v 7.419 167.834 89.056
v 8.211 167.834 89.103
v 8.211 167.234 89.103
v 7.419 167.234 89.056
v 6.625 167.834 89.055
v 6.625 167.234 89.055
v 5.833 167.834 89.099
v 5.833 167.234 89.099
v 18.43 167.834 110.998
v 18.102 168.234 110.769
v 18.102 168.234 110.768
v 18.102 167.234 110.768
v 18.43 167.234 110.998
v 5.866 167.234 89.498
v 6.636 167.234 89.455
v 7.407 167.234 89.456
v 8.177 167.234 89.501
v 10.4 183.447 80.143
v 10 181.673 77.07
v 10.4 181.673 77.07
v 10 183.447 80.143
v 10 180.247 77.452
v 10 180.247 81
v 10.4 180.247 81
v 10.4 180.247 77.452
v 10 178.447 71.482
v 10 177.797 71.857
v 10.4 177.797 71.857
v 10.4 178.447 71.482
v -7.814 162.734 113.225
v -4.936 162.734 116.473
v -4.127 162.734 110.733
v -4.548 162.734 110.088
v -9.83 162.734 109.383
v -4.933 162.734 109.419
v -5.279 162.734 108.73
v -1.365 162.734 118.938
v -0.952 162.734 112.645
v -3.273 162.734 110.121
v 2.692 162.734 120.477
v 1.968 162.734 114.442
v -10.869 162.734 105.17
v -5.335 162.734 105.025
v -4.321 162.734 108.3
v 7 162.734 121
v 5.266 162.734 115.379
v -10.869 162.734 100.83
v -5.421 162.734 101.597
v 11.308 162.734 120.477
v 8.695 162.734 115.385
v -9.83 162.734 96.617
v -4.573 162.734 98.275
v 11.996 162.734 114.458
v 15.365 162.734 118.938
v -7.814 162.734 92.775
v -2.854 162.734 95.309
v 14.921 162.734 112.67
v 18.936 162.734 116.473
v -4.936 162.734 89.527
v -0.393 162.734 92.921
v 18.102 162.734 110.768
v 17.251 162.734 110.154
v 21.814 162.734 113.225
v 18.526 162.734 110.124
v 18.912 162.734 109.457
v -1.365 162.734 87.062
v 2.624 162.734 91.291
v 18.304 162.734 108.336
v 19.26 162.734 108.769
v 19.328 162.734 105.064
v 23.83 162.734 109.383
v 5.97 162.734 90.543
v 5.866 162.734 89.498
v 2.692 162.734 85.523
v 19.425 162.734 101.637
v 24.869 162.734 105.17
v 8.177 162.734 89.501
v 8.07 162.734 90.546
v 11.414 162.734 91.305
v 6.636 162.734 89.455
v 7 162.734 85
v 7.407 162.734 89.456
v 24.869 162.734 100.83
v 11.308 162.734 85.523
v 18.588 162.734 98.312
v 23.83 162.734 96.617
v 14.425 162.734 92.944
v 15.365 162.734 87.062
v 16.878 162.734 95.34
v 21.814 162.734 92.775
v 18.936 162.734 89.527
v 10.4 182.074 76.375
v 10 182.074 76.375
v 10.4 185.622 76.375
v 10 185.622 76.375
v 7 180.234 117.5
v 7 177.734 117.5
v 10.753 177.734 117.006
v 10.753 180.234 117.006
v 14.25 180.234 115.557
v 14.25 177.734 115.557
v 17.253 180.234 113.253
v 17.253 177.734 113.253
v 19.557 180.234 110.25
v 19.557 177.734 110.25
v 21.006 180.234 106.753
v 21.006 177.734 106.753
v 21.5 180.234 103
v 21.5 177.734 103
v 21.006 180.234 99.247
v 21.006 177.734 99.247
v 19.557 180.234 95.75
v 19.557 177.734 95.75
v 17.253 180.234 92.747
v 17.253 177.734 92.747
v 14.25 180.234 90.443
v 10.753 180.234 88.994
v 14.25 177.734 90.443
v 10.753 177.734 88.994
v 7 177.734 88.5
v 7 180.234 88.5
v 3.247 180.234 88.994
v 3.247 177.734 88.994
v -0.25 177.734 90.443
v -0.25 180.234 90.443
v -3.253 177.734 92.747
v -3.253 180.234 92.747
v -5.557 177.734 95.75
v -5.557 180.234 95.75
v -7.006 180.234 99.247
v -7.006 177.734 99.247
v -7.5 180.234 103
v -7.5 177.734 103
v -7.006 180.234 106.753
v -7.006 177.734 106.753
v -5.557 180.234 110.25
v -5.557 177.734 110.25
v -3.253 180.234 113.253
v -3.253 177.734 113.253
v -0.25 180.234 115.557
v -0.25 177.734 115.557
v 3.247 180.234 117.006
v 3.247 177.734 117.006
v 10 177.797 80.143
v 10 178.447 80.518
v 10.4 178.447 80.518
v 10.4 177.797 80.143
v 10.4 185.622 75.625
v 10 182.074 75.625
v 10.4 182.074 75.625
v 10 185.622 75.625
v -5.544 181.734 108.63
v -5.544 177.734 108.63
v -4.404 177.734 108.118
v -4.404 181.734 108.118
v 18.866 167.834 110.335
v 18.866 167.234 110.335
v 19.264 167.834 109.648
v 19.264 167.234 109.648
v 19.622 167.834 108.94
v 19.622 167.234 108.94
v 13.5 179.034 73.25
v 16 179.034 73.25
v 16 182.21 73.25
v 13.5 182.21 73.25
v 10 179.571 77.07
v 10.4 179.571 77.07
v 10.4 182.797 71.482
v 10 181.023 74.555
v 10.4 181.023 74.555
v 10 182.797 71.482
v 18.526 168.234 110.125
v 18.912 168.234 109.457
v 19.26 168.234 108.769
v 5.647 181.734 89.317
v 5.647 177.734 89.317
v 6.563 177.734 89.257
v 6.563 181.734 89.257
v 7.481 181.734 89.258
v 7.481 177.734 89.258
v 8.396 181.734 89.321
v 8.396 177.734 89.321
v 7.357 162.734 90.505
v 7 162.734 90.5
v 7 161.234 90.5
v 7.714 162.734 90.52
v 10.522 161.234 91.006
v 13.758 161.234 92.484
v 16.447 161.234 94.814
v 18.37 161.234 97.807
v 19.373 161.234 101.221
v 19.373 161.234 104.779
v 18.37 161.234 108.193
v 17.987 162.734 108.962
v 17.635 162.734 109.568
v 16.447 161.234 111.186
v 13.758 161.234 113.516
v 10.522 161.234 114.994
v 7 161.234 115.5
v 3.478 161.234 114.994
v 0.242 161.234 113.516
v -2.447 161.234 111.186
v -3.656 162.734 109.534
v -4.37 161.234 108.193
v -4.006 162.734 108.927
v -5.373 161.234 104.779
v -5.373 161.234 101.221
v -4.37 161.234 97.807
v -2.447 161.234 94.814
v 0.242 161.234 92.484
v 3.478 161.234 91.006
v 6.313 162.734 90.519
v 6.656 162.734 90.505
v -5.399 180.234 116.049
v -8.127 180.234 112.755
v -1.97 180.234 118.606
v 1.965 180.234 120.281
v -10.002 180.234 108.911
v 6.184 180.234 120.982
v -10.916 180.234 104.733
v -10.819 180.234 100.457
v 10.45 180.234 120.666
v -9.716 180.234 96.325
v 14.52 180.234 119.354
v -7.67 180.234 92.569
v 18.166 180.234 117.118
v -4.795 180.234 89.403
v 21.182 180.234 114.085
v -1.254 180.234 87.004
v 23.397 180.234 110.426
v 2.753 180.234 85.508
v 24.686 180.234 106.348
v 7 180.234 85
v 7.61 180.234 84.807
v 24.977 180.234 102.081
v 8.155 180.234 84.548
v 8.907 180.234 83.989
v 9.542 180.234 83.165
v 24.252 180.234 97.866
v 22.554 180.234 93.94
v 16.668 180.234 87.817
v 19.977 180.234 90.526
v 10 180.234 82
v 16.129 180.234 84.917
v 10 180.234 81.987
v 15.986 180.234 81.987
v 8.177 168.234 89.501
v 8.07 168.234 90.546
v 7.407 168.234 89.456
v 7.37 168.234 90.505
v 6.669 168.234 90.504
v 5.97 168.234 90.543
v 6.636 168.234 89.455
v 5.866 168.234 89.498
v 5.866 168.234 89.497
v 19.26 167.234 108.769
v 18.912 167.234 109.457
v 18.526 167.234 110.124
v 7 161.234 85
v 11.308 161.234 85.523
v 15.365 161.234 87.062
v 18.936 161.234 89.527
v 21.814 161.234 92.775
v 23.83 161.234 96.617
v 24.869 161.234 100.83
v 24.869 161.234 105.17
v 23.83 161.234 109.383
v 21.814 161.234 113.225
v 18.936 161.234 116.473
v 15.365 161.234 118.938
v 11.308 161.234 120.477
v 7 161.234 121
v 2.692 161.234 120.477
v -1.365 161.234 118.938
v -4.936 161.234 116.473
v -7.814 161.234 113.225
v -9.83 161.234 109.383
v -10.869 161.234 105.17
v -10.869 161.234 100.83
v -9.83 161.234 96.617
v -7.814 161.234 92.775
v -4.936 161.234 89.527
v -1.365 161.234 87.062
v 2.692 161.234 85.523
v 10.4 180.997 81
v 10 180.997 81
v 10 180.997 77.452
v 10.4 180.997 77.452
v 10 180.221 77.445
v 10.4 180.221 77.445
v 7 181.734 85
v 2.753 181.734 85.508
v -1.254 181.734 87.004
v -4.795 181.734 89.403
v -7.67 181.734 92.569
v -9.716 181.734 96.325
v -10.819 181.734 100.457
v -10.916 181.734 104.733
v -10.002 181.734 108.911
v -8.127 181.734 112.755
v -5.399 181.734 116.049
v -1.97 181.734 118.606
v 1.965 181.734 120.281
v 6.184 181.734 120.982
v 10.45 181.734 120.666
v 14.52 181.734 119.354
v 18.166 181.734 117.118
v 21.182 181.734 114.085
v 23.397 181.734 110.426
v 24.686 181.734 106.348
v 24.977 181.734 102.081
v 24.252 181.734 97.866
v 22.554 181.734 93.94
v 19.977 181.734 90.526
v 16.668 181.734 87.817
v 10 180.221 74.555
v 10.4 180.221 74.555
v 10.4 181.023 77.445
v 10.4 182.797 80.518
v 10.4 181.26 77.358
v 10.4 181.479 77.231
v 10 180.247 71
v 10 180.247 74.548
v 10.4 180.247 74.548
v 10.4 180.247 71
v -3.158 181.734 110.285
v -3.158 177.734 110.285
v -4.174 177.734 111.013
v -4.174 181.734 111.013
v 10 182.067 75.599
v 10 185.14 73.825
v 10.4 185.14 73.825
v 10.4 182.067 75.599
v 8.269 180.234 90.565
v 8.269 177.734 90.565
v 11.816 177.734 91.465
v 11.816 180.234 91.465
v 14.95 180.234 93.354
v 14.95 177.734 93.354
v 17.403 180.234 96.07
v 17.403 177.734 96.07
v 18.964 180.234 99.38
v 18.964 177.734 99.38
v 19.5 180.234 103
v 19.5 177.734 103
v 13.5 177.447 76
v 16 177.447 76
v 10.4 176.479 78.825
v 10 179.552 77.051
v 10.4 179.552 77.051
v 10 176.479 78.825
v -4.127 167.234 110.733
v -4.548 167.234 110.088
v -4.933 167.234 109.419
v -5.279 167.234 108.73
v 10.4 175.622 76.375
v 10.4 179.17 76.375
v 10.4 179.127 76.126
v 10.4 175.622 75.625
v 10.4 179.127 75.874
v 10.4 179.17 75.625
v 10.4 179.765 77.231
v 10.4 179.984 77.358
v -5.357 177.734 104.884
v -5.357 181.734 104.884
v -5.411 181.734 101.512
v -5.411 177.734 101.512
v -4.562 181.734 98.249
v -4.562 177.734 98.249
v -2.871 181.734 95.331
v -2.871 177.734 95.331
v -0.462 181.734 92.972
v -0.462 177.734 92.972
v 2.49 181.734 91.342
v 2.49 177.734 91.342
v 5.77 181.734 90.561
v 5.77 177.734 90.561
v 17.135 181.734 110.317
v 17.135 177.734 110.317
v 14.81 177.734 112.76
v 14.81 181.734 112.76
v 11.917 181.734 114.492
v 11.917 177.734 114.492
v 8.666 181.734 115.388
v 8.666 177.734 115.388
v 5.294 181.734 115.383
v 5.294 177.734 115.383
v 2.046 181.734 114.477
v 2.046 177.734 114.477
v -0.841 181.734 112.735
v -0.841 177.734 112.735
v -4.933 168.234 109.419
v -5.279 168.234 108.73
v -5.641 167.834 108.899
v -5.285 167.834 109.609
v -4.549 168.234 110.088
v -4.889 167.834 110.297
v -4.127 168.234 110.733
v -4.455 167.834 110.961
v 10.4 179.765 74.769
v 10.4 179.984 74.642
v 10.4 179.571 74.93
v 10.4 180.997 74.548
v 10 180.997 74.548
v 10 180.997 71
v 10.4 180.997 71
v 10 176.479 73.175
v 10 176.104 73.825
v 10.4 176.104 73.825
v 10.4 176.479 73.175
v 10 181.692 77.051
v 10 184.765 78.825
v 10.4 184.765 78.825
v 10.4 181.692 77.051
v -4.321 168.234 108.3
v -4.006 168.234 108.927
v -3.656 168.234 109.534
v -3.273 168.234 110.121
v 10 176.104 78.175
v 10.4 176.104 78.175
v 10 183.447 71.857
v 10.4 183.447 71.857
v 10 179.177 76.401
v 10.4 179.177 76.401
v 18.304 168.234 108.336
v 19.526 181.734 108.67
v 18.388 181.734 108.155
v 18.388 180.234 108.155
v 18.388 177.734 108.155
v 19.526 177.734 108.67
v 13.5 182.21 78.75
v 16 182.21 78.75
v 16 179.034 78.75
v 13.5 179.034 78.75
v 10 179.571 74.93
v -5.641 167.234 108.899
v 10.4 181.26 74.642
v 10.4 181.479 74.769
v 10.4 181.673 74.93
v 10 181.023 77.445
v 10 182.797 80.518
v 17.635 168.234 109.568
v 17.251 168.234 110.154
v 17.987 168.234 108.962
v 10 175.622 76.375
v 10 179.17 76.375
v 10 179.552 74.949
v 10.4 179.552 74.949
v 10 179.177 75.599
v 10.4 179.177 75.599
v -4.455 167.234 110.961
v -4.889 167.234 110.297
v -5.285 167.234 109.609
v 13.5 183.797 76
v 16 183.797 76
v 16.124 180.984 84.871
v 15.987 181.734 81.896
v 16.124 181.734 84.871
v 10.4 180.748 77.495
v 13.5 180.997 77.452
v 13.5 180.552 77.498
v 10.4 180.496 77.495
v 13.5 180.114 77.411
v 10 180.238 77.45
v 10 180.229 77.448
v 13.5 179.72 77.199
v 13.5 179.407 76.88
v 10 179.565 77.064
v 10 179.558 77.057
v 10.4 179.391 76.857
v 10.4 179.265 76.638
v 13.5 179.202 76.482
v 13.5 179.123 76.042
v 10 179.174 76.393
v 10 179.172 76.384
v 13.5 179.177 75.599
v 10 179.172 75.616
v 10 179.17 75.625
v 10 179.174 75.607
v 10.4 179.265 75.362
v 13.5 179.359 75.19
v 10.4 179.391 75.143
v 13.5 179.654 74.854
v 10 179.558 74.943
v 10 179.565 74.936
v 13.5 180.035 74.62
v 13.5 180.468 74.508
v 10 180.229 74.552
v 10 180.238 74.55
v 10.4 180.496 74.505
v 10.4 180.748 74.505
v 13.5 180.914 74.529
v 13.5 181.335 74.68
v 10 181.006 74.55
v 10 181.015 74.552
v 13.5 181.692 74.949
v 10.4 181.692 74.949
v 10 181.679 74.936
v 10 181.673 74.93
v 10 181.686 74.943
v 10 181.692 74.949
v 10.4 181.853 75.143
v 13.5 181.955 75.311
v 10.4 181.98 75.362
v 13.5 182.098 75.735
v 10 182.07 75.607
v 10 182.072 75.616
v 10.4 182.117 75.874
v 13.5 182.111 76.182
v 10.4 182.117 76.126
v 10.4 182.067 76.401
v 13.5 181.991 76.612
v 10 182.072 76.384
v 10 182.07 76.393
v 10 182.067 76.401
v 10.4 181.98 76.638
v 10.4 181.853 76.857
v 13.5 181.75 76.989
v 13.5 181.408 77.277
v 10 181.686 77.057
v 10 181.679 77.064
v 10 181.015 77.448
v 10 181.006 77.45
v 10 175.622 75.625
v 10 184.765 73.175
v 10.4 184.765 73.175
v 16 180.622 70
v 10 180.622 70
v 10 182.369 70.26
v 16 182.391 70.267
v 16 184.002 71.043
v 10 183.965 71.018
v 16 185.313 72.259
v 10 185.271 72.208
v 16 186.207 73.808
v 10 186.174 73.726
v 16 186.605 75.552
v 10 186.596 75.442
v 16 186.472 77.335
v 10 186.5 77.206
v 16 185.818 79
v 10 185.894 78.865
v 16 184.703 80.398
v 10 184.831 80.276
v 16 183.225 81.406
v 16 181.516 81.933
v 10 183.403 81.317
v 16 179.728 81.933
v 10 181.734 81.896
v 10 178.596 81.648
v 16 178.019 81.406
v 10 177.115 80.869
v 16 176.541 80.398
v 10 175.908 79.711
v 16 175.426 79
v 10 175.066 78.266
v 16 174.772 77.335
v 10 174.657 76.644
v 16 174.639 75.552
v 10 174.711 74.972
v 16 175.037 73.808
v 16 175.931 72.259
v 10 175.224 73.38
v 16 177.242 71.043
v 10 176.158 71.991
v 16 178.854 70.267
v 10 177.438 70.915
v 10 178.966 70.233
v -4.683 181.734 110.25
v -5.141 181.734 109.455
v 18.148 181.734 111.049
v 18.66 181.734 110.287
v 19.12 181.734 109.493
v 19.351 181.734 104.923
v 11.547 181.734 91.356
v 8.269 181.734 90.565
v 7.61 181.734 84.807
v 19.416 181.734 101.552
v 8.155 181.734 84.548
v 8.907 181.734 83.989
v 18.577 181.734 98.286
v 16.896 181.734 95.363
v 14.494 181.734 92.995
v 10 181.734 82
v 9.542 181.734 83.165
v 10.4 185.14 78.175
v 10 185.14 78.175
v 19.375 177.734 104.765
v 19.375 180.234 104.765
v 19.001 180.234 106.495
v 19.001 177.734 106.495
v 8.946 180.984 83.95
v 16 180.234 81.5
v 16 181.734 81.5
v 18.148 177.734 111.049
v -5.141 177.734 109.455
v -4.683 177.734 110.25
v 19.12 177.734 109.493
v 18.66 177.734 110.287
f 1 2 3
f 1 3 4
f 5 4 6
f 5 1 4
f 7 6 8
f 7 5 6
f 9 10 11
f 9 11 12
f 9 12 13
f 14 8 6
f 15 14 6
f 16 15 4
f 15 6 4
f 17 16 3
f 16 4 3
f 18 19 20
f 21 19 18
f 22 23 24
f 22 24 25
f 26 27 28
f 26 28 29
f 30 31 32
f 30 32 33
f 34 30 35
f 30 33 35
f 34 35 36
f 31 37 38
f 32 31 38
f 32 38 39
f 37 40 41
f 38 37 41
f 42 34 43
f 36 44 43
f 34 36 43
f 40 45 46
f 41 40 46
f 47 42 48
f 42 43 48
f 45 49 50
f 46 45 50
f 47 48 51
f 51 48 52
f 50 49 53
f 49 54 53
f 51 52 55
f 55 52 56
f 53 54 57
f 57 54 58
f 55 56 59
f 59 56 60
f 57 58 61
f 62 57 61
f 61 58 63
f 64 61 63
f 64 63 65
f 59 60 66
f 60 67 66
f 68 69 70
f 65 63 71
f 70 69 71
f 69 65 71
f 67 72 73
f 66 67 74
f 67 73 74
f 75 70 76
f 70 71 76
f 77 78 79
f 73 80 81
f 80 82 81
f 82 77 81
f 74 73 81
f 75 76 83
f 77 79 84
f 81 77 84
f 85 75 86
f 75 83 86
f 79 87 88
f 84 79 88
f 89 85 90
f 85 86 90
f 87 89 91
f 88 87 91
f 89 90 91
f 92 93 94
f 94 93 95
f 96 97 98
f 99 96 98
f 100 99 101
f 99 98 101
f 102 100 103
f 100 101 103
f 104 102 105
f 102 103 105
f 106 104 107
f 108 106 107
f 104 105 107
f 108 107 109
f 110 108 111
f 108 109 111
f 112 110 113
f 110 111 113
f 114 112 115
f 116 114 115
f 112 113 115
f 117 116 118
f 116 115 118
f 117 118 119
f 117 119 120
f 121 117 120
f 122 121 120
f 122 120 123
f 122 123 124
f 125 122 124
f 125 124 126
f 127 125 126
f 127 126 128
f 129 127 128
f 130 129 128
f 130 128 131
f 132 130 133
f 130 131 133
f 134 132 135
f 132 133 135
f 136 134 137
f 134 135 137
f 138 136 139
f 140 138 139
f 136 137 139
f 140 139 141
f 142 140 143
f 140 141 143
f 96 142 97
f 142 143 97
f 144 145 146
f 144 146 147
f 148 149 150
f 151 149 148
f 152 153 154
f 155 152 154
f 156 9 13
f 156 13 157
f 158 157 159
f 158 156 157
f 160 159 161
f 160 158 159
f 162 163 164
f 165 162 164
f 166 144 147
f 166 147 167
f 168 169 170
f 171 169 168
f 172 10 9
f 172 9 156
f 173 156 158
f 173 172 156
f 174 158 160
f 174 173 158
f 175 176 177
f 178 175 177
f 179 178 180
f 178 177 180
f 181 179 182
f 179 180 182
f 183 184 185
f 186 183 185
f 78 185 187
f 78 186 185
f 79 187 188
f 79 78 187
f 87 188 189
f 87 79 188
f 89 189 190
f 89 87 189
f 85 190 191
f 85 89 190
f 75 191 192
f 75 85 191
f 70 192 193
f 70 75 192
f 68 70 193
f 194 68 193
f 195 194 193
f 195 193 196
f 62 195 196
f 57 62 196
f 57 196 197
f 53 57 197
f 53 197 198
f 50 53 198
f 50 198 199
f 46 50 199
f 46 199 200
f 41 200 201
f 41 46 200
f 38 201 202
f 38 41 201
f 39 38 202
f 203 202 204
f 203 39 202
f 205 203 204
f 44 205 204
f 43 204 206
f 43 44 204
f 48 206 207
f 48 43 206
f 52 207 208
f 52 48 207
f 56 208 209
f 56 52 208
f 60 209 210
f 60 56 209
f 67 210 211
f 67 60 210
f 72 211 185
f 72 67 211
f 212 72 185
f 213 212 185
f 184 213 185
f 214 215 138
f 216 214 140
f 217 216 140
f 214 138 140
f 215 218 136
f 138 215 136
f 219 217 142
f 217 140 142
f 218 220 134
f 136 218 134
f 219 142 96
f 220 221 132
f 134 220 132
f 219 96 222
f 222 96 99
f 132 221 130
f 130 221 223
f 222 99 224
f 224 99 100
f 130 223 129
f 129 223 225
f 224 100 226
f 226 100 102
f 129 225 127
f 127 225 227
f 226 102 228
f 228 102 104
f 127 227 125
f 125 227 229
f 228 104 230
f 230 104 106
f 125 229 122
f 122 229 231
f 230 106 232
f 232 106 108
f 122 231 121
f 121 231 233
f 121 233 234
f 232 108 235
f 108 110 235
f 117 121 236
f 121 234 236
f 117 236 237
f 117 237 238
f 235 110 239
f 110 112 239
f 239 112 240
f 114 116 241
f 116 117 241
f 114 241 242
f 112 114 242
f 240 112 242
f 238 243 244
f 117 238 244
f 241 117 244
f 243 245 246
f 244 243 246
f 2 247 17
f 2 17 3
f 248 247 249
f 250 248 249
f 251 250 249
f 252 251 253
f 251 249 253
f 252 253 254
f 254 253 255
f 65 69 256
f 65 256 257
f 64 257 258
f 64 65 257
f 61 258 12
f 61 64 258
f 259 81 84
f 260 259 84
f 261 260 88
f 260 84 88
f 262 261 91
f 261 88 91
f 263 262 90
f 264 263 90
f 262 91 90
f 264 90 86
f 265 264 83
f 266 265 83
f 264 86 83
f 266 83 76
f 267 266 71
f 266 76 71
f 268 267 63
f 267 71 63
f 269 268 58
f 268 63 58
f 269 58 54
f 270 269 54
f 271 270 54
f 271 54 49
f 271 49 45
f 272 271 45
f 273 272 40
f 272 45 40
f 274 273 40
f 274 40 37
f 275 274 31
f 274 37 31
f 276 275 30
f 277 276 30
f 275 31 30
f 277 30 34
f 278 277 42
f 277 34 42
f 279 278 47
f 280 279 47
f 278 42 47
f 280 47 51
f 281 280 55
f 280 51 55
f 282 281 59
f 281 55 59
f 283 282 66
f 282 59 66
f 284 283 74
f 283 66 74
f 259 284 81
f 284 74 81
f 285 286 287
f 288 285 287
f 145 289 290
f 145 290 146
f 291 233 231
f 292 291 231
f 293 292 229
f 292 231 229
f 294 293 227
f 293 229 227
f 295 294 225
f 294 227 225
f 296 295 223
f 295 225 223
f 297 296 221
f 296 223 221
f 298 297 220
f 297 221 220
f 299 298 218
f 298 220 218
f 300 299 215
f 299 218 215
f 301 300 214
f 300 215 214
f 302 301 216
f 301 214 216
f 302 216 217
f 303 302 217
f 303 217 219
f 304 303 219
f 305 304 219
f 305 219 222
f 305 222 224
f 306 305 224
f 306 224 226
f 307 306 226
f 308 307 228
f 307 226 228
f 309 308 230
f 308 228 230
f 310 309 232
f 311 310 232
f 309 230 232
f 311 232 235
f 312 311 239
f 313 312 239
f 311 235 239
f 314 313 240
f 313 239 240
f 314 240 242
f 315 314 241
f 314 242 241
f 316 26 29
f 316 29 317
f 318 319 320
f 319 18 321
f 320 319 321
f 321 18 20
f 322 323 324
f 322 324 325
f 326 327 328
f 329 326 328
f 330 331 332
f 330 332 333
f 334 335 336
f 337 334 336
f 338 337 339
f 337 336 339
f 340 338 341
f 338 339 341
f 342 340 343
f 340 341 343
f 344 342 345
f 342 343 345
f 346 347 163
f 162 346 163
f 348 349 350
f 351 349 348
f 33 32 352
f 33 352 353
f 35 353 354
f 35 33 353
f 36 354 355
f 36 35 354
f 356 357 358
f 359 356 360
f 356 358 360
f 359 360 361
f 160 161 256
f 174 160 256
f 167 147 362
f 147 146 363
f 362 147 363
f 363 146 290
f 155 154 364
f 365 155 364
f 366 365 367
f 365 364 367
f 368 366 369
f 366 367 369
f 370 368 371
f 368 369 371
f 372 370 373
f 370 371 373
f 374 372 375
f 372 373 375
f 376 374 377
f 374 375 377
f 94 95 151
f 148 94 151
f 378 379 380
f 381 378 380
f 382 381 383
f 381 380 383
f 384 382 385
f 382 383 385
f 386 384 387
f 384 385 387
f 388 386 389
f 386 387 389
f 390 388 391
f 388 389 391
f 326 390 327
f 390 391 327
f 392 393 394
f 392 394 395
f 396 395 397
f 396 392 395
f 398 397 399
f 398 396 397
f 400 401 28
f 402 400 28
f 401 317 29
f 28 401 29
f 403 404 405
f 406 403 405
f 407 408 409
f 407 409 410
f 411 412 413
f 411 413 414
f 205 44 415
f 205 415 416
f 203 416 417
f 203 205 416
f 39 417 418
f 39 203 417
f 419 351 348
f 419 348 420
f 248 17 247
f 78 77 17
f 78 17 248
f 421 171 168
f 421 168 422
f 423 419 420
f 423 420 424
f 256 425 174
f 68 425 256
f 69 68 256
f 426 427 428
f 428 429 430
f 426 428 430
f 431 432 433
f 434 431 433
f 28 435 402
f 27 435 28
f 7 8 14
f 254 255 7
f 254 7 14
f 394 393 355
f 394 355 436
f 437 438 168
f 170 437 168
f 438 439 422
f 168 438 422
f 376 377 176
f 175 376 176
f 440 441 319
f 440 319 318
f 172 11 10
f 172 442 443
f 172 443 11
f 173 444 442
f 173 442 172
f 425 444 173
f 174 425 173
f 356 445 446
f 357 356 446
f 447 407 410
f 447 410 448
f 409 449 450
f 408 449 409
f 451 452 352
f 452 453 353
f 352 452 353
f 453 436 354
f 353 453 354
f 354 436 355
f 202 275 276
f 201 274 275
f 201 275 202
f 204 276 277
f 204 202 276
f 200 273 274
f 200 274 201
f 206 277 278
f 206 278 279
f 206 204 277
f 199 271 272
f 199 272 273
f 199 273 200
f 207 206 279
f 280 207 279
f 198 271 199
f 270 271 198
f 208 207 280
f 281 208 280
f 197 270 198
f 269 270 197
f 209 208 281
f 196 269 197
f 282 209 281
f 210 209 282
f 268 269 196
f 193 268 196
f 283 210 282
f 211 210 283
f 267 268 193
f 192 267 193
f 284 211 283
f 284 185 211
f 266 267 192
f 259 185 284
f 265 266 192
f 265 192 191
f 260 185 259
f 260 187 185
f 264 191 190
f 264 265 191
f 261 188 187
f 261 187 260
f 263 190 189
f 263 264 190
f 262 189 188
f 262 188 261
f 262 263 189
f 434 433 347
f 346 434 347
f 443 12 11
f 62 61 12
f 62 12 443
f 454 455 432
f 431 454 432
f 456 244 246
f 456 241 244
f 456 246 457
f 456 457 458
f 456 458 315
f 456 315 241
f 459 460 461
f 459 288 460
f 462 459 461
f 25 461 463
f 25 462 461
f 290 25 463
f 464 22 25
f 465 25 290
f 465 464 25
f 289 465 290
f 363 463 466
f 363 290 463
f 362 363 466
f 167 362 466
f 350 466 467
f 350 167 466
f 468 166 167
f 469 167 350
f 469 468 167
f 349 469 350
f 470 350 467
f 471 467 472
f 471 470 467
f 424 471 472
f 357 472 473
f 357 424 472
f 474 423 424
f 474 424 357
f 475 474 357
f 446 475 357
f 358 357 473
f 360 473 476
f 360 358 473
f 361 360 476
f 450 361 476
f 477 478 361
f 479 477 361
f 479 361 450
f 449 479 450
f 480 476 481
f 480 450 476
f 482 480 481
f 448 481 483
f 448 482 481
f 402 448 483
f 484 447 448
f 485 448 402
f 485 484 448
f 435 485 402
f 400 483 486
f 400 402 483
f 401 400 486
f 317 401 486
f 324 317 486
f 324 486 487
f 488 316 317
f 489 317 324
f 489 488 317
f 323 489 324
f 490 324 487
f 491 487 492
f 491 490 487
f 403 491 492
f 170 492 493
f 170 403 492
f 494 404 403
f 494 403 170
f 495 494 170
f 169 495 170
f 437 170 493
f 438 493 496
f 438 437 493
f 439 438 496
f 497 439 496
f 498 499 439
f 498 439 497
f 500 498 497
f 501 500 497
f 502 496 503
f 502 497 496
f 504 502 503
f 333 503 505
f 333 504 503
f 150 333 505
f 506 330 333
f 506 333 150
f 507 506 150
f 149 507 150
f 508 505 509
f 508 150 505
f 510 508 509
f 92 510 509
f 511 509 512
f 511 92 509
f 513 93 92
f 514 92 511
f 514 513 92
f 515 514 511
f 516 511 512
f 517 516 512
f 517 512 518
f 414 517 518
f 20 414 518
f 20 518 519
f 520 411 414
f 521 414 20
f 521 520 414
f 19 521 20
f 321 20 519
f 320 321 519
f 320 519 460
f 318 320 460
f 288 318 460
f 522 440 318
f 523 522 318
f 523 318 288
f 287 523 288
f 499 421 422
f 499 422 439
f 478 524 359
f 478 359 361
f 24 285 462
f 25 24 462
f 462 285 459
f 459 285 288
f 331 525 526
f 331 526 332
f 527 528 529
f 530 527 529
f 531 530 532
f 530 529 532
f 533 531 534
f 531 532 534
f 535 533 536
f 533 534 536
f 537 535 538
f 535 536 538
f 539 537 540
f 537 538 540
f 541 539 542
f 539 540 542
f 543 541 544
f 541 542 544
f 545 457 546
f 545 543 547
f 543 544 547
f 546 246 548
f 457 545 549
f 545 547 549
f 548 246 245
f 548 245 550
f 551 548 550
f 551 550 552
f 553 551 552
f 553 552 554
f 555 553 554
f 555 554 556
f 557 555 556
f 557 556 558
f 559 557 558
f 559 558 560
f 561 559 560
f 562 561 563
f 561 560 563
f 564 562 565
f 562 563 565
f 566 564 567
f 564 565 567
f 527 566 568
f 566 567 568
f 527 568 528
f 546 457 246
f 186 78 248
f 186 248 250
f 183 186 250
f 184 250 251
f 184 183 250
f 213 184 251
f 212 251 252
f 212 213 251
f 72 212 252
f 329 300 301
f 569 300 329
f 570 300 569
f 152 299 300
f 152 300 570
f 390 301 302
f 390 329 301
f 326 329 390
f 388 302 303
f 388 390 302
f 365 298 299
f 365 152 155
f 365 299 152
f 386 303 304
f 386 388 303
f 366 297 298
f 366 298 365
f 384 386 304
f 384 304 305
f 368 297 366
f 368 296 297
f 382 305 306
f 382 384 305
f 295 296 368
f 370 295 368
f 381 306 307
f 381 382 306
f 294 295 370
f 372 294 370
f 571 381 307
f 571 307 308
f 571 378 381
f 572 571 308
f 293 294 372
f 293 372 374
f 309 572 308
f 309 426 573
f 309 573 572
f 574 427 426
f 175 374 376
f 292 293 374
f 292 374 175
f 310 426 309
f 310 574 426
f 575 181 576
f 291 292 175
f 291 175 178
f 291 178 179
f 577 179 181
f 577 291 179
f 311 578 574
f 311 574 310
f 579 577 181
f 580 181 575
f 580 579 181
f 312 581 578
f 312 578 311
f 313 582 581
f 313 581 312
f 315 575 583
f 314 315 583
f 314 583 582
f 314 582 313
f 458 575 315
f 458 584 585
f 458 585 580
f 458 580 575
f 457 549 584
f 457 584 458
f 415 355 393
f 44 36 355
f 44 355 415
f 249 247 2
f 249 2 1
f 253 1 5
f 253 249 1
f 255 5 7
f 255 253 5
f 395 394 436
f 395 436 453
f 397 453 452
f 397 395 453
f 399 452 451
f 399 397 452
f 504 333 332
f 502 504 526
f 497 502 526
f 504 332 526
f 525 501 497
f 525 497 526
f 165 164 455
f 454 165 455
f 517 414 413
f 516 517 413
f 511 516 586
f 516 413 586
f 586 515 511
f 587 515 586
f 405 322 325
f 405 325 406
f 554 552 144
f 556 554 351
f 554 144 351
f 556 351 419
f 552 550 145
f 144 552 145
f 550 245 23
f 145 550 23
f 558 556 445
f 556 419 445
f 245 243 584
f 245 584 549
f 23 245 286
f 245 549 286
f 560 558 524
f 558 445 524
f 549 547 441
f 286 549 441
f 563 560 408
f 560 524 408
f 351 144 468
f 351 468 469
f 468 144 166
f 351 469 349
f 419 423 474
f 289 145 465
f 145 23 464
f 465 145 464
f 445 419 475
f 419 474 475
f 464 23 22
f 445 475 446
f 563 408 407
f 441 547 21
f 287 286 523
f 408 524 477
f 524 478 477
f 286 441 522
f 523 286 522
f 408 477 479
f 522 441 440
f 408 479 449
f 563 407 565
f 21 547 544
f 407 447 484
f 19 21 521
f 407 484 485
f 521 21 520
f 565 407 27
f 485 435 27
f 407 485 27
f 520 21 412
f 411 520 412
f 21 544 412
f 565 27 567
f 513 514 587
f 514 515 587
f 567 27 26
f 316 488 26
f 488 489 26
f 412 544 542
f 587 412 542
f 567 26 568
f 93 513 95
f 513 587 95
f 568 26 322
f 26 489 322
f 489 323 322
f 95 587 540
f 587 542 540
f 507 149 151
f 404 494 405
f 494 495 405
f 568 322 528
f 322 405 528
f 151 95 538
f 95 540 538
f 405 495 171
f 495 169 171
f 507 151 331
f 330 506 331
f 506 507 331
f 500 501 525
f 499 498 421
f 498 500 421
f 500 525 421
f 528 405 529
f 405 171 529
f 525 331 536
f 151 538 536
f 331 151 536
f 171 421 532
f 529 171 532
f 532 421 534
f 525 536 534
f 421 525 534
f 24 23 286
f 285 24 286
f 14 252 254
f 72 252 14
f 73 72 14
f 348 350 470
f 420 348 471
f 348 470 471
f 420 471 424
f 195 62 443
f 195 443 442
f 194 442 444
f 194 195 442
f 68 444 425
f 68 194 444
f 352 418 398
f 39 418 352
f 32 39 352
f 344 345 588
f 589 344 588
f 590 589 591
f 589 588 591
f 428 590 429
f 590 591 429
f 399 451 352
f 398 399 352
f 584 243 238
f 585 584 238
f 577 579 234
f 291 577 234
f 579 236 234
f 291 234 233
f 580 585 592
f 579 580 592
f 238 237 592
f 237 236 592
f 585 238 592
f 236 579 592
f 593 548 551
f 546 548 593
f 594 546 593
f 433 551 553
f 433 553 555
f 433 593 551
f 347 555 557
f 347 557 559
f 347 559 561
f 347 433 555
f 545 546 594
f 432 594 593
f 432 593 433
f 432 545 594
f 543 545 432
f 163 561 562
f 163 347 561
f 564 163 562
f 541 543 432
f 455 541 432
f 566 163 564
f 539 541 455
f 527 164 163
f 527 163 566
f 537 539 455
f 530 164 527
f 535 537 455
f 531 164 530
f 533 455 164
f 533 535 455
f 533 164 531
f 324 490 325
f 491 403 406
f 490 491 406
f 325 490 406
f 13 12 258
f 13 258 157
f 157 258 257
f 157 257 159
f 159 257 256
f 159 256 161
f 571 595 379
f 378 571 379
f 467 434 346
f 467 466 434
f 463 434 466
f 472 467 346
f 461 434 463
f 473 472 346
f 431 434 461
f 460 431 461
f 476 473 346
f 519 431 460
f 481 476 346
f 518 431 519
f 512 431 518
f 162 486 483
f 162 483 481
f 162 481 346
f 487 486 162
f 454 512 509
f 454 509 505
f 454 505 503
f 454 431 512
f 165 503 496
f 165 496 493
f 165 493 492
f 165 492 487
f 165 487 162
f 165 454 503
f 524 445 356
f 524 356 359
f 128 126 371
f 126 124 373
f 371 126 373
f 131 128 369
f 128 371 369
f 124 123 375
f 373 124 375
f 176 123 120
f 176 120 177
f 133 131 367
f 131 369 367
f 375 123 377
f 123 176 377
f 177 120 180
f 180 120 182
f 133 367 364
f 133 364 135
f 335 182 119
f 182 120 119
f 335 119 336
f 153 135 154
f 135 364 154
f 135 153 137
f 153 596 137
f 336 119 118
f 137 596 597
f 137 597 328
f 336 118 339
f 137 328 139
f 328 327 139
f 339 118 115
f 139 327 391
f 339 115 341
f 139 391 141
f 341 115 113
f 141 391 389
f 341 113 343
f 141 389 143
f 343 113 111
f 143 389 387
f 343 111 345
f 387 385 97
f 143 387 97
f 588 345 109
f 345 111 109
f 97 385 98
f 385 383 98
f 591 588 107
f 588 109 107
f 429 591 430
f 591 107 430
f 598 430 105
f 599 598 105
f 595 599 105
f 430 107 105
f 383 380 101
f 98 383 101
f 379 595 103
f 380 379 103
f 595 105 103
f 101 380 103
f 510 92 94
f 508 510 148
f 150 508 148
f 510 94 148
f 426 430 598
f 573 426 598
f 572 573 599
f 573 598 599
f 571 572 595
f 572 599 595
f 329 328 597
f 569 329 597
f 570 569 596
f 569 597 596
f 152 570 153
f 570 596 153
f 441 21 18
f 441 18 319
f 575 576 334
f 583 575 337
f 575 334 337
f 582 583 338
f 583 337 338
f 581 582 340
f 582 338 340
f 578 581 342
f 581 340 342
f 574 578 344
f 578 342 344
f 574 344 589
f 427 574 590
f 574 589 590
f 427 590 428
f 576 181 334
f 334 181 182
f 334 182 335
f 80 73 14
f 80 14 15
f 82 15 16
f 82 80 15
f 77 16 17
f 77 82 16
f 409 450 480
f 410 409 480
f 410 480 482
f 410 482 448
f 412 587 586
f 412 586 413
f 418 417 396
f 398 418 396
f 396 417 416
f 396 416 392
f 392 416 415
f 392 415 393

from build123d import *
from build123d.topology import SkipClean

# Parameters (mm, degrees)
ESBO_O120_R                = 6
RESSALTO_EXTRUS_O39_DEPTH  = 6
ESBO_O120_3_W              = 10
ESBO_O120_3_H              = 0.75
ESBO_O120_3_W_2            = 0.75
ESBO_O120_3_H_2            = 10
CORTE_EXTRUS_O_FINA1_DEPTH = 0.4
CORTE_EXTRUS_O49_REACH     = 205.931
ESBO_O120_4_R              = 1.5
CORTE_EXTRUS_O50_DEPTH     = 2.5
RESSALTO_EXTRUS_O40_DEPTH  = 1.5
RESSALTO_EXTRUS_O41_START  = -2.5
ESBO_O122_12_R             = 14.5
RESSALTO_EXTRUS_O41_DEPTH  = 2.5
ESBO_O123_R                = 18
ESBO_O123_R_2              = 12.5
RESSALTO_EXTRUS_O42_DEPTH  = 1.5
RESSALTO_EXTRUS_O43_DEPTH  = 5.5
RESSALTO_EXTRUS_O44_DEPTH  = 1
CHANFRO1_SIZE              = 0.4


with BuildPart() as part:
    # Esboço120 → Ressalto-extrusão39 (new body)
    with BuildSketch(Plane(origin=(10, 0, 0), x_dir=(0, 0, -1), z_dir=(1, 0, 0))):
        with Locations((-76, 180.622055231)):
            Circle(ESBO_O120_R)
    extrude(amount=RESSALTO_EXTRUS_O39_DEPTH)

    # Esboço120<3> → Corte-Extrusão-Fina1 (cut)
    with BuildSketch(Plane(origin=(10, 0, 0), x_dir=(0, 0, -1), z_dir=(1, 0, 0))):
        Polygon((-78.824759526, 184.76468225), (-73.824759526, 176.104428212), (-73.175240474, 176.479428212), (-78.175240474, 185.13968225), align=None)
        Polygon((-78.175240474, 176.104428212), (-73.175240474, 184.76468225), (-73.824759526, 185.13968225), (-78.824759526, 176.479428212), align=None)
        Polygon((-80.142627019, 177.797295704), (-71.482372981, 182.797295704), (-71.857372981, 183.446814757), (-80.517627019, 178.446814757), align=None)
        with Locations((-76, 180.622055231)):
            Rectangle(ESBO_O120_3_W, ESBO_O120_3_H)
        Polygon((-71.482372981, 178.446814757), (-80.142627019, 183.446814757), (-80.517627019, 182.797295704), (-71.857372981, 177.797295704), align=None)
        with Locations((-76, 180.622055231)):
            Rectangle(ESBO_O120_3_W_2, ESBO_O120_3_H_2)
    extrude(amount=CORTE_EXTRUS_O_FINA1_DEPTH, mode=Mode.SUBTRACT)

    # Esboço120<4> → Corte-extrusão49 (cut, up to next)
    with BuildSketch(Plane(origin=(10, 0, 0), x_dir=(0, 0, -1), z_dir=(1, 0, 0)), mode=Mode.PRIVATE) as corte_extrus_o49_sk1:
        with Locations(Location((-76, 180.622055231, 0), (0, 0, 165.522487814))):
            Circle(ESBO_O120_4_R)
    corte_extrus_o49_tool1 = extrude(corte_extrus_o49_sk1.sketch, amount=CORTE_EXTRUS_O49_REACH, mode=Mode.PRIVATE) & part.part
    add(corte_extrus_o49_tool1.solids().sort_by_distance((10, 180.622055, 76))[0], mode=Mode.SUBTRACT)

    # Esboço121 → Corte-extrusão50 (cut)
    with BuildSketch(Plane(origin=(16, 0, 0), x_dir=(0, 0, -1), z_dir=(1, 0, 0))):
        Polygon((-76, 183.797481711), (-78.75, 182.209768471), (-78.75, 179.03434199), (-76, 177.44662875), (-73.25, 179.03434199), (-73.25, 182.209768471), align=None)
    extrude(amount=-CORTE_EXTRUS_O50_DEPTH, mode=Mode.SUBTRACT)

    # Esboço122 → Ressalto-extrusão40 (add)
    with BuildSketch(Plane(origin=(0, 180.233826663, 0), x_dir=(1, 0, 0), z_dir=(0, 1, 0))):
        with BuildLine():
            Line((10, -81.5), (10, -82))
            add(Edge.make_bspline(
                [(10, -82), (9.391813157, -84.399749478), (7, -85)],
                knots=[0, 0, 0, 1, 1, 1], degree=2))
            ThreePointArc((7, -85), (1.965005041, -120.281459017), (16.66800656, -87.816797138))
            add(Edge.make_bspline(
                [(16, -81.5), (15.870115204, -84.692384764), (16.66800656, -87.816797138)],
                knots=[0, 0, 0, 1, 1, 1], degree=2))
            Line((16, -81.5), (10, -81.5))
        make_face()
        with BuildLine():
            ThreePointArc((8.26925066, -90.564606851), (17.835252837, -96.767240101), (18.387638276, -108.154773952))
            Line((18.387638276, -108.154773952), (19.526402104, -108.670251347))
            ThreePointArc((19.526402104, -108.670251347), (18.896890309, -109.89394669), (18.148215147, -111.048589879))
            Line((18.148215147, -111.048589879), (17.134741043, -110.31689989))
            ThreePointArc((17.134741043, -110.31689989), (6.98010199, -115.499984163), (-3.157984331, -110.28459706))
            Line((-3.157984331, -110.28459706), (-4.173782764, -111.013056766))
            ThreePointArc((-4.173782764, -111.013056766), (-4.918778121, -109.856035889), (-5.544390873, -108.630342585))
            Line((-5.544390873, -108.630342585), (-4.403991703, -108.118493259))
            ThreePointArc((-4.403991703, -108.118493259), (-3.815354827, -96.732775736), (5.770346055, -90.560628988))
            Line((5.770346055, -90.560628988), (5.64738066, -89.316691887))
            ThreePointArc((5.64738066, -89.316691887), (7.021887811, -89.250017421), (8.396175726, -89.321067537))
            Line((8.396175726, -89.321067537), (8.26925066, -90.564606851))
        make_face(mode=Mode.SUBTRACT)
    extrude(amount=RESSALTO_EXTRUS_O40_DEPTH)

    # Esboço122<12> → Ressalto-extrusão41 (add)
    with BuildSketch(Plane(origin=(0, 180.233826663, 0), x_dir=(1, 0, 0), z_dir=(0, 1, 0)).offset(RESSALTO_EXTRUS_O41_START)):
        with Locations(Location((7, -103, 0), (0, 0, 270))):
            Circle(ESBO_O122_12_R)
        with BuildLine():
            Line((8.396175726, -89.321067537), (8.26925066, -90.564606851))
            ThreePointArc((8.26925066, -90.564606851), (16.276735235, -94.621922454), (19.5, -103))
            ThreePointArc((19.5, -103), (19.218745403, -105.636714011), (18.387638276, -108.154773952))
            Line((18.387638276, -108.154773952), (19.526402104, -108.670251347))
            ThreePointArc((19.526402104, -108.670251347), (18.896890309, -109.89394669), (18.148215147, -111.048589879))
            Line((18.148215147, -111.048589879), (17.134741043, -110.31689989))
            ThreePointArc((17.134741043, -110.31689989), (6.98010199, -115.499984163), (-3.157984331, -110.28459706))
            Line((-3.157984331, -110.28459706), (-4.173782764, -111.013056766))
            ThreePointArc((-4.173782764, -111.013056766), (-4.918778121, -109.856035889), (-5.544390873, -108.630342585))
            Line((-5.544390873, -108.630342585), (-4.403991703, -108.118493259))
            ThreePointArc((-4.403991703, -108.118493259), (-3.815354827, -96.732775736), (5.770346055, -90.560628988))
            Line((5.770346055, -90.560628988), (5.64738066, -89.316691887))
            ThreePointArc((5.64738066, -89.316691887), (7.021887811, -89.250017421), (8.396175726, -89.321067537))
        make_face(mode=Mode.SUBTRACT)
    extrude(amount=RESSALTO_EXTRUS_O41_DEPTH)


with BuildPart() as body_2:
    # Esboço123 → Ressalto-extrusão42 (new body)
    with BuildSketch(Plane(origin=(0, 162.733826663, 0), x_dir=(-1, 0, 0), z_dir=(0, -1, 0))):
        with Locations(Location((-7, -103, 0), (0, 0, 90))):
            Circle(ESBO_O123_R)
        with Locations(Location((-7, -103, 0), (0, 0, 90))):
            Circle(ESBO_O123_R_2, mode=Mode.SUBTRACT)
    extrude(amount=RESSALTO_EXTRUS_O42_DEPTH)

    # Esboço123<3> → Ressalto-extrusão43 (add)
    with SkipClean():  # the faces are left unmerged after this step: merging them gives an invalid solid
        with BuildSketch(Plane(origin=(0, 162.733826663, 0), x_dir=(-1, 0, 0), z_dir=(0, -1, 0))):
            with BuildLine():
                ThreePointArc((-17.250514111, -110.15380741), (-17.815354827, -109.267224264), (-18.303704182, -108.336316311))
                Line((-18.303704182, -108.336316311), (-19.260378769, -108.769368461))
                ThreePointArc((-19.260378769, -108.769368461), (-18.723844632, -109.793671102), (-18.101932901, -110.768499589))
                Line((-18.101932901, -110.768499589), (-17.250514111, -110.15380741))
            make_face()
            with BuildLine():
                Line((5.278684444, -108.730306129), (4.320636006, -108.300301917))
                ThreePointArc((4.320636006, -108.300301917), (3.835252837, -109.232759899), (3.273237579, -110.121136823))
                Line((3.273237579, -110.121136823), (4.126609036, -110.733115243))
                ThreePointArc((4.126609036, -110.733115243), (4.745414075, -109.75631173), (5.278684444, -108.730306129))
            make_face()
            with BuildLine():
                Line((-8.176751543, -89.501194282), (-8.070121896, -90.545890673))
                ThreePointArc((-8.070121896, -90.545890673), (-7.01989801, -90.500015837), (-5.969533397, -90.542546866))
                Line((-5.969533397, -90.542546866), (-5.866230267, -89.497516295))
                ThreePointArc((-5.866230267, -89.497516295), (-7.021569443, -89.450017168), (-8.176751543, -89.501194282))
            make_face()
        extrude(amount=-RESSALTO_EXTRUS_O43_DEPTH)

    # Esboço124 → Ressalto-extrusão44 (add)
    with SkipClean():  # the faces are left unmerged after this step: merging them gives an invalid solid
        with BuildSketch(Plane(origin=(0, 168.233826663, 0), x_dir=(1, 0, 0), z_dir=(0, 1, 0))):
            with BuildLine():
                Line((18.101932901, -110.768499589), (18.429665238, -110.99782799))
                ThreePointArc((18.429665238, -110.99782799), (19.069935987, -109.994222278), (19.62230877, -108.939681921))
                Line((19.62230877, -108.939681921), (19.260378769, -108.769368461))
                ThreePointArc((19.260378769, -108.769368461), (18.723844632, -109.793671102), (18.101932901, -110.768499589))
            make_face()
            with BuildLine():
                Line((8.176751543, -89.501194282), (8.211489596, -89.102705553))
                ThreePointArc((8.211489596, -89.102705553), (7.02220618, -89.050017674), (5.832761049, -89.098918991))
                Line((5.832761049, -89.098918991), (5.866230267, -89.497516295))
                ThreePointArc((5.866230267, -89.497516295), (7.021569443, -89.450017168), (8.176751543, -89.501194282))
            make_face()
            with BuildLine():
                Line((-5.278684444, -108.730306129), (-5.641154833, -108.899466458))
                ThreePointArc((-5.641154833, -108.899466458), (-5.092142166, -109.955760047), (-4.455069819, -110.961399088))
                Line((-4.455069819, -110.961399088), (-4.126609036, -110.733115243))
                ThreePointArc((-4.126609036, -110.733115243), (-4.745414075, -109.75631173), (-5.278684444, -108.730306129))
            make_face()
        extrude(amount=-RESSALTO_EXTRUS_O44_DEPTH)

    # Chanfro1
    chanfro1_edges = [body_2.edges().sort_by_distance(p)[0] for p in [
        (19.069935987, 168.233826663, 109.994222278),
        (-5.092142166, 168.233826663, 109.955760047),
        (7.02220618, 168.233826663, 89.050017674),
    ]]
    chamfer(chanfro1_edges, length=CHANFRO1_SIZE - 0.0001)  # a hair under: the kernel refuses the full size


solid = Compound([part.part, body_2.part])
